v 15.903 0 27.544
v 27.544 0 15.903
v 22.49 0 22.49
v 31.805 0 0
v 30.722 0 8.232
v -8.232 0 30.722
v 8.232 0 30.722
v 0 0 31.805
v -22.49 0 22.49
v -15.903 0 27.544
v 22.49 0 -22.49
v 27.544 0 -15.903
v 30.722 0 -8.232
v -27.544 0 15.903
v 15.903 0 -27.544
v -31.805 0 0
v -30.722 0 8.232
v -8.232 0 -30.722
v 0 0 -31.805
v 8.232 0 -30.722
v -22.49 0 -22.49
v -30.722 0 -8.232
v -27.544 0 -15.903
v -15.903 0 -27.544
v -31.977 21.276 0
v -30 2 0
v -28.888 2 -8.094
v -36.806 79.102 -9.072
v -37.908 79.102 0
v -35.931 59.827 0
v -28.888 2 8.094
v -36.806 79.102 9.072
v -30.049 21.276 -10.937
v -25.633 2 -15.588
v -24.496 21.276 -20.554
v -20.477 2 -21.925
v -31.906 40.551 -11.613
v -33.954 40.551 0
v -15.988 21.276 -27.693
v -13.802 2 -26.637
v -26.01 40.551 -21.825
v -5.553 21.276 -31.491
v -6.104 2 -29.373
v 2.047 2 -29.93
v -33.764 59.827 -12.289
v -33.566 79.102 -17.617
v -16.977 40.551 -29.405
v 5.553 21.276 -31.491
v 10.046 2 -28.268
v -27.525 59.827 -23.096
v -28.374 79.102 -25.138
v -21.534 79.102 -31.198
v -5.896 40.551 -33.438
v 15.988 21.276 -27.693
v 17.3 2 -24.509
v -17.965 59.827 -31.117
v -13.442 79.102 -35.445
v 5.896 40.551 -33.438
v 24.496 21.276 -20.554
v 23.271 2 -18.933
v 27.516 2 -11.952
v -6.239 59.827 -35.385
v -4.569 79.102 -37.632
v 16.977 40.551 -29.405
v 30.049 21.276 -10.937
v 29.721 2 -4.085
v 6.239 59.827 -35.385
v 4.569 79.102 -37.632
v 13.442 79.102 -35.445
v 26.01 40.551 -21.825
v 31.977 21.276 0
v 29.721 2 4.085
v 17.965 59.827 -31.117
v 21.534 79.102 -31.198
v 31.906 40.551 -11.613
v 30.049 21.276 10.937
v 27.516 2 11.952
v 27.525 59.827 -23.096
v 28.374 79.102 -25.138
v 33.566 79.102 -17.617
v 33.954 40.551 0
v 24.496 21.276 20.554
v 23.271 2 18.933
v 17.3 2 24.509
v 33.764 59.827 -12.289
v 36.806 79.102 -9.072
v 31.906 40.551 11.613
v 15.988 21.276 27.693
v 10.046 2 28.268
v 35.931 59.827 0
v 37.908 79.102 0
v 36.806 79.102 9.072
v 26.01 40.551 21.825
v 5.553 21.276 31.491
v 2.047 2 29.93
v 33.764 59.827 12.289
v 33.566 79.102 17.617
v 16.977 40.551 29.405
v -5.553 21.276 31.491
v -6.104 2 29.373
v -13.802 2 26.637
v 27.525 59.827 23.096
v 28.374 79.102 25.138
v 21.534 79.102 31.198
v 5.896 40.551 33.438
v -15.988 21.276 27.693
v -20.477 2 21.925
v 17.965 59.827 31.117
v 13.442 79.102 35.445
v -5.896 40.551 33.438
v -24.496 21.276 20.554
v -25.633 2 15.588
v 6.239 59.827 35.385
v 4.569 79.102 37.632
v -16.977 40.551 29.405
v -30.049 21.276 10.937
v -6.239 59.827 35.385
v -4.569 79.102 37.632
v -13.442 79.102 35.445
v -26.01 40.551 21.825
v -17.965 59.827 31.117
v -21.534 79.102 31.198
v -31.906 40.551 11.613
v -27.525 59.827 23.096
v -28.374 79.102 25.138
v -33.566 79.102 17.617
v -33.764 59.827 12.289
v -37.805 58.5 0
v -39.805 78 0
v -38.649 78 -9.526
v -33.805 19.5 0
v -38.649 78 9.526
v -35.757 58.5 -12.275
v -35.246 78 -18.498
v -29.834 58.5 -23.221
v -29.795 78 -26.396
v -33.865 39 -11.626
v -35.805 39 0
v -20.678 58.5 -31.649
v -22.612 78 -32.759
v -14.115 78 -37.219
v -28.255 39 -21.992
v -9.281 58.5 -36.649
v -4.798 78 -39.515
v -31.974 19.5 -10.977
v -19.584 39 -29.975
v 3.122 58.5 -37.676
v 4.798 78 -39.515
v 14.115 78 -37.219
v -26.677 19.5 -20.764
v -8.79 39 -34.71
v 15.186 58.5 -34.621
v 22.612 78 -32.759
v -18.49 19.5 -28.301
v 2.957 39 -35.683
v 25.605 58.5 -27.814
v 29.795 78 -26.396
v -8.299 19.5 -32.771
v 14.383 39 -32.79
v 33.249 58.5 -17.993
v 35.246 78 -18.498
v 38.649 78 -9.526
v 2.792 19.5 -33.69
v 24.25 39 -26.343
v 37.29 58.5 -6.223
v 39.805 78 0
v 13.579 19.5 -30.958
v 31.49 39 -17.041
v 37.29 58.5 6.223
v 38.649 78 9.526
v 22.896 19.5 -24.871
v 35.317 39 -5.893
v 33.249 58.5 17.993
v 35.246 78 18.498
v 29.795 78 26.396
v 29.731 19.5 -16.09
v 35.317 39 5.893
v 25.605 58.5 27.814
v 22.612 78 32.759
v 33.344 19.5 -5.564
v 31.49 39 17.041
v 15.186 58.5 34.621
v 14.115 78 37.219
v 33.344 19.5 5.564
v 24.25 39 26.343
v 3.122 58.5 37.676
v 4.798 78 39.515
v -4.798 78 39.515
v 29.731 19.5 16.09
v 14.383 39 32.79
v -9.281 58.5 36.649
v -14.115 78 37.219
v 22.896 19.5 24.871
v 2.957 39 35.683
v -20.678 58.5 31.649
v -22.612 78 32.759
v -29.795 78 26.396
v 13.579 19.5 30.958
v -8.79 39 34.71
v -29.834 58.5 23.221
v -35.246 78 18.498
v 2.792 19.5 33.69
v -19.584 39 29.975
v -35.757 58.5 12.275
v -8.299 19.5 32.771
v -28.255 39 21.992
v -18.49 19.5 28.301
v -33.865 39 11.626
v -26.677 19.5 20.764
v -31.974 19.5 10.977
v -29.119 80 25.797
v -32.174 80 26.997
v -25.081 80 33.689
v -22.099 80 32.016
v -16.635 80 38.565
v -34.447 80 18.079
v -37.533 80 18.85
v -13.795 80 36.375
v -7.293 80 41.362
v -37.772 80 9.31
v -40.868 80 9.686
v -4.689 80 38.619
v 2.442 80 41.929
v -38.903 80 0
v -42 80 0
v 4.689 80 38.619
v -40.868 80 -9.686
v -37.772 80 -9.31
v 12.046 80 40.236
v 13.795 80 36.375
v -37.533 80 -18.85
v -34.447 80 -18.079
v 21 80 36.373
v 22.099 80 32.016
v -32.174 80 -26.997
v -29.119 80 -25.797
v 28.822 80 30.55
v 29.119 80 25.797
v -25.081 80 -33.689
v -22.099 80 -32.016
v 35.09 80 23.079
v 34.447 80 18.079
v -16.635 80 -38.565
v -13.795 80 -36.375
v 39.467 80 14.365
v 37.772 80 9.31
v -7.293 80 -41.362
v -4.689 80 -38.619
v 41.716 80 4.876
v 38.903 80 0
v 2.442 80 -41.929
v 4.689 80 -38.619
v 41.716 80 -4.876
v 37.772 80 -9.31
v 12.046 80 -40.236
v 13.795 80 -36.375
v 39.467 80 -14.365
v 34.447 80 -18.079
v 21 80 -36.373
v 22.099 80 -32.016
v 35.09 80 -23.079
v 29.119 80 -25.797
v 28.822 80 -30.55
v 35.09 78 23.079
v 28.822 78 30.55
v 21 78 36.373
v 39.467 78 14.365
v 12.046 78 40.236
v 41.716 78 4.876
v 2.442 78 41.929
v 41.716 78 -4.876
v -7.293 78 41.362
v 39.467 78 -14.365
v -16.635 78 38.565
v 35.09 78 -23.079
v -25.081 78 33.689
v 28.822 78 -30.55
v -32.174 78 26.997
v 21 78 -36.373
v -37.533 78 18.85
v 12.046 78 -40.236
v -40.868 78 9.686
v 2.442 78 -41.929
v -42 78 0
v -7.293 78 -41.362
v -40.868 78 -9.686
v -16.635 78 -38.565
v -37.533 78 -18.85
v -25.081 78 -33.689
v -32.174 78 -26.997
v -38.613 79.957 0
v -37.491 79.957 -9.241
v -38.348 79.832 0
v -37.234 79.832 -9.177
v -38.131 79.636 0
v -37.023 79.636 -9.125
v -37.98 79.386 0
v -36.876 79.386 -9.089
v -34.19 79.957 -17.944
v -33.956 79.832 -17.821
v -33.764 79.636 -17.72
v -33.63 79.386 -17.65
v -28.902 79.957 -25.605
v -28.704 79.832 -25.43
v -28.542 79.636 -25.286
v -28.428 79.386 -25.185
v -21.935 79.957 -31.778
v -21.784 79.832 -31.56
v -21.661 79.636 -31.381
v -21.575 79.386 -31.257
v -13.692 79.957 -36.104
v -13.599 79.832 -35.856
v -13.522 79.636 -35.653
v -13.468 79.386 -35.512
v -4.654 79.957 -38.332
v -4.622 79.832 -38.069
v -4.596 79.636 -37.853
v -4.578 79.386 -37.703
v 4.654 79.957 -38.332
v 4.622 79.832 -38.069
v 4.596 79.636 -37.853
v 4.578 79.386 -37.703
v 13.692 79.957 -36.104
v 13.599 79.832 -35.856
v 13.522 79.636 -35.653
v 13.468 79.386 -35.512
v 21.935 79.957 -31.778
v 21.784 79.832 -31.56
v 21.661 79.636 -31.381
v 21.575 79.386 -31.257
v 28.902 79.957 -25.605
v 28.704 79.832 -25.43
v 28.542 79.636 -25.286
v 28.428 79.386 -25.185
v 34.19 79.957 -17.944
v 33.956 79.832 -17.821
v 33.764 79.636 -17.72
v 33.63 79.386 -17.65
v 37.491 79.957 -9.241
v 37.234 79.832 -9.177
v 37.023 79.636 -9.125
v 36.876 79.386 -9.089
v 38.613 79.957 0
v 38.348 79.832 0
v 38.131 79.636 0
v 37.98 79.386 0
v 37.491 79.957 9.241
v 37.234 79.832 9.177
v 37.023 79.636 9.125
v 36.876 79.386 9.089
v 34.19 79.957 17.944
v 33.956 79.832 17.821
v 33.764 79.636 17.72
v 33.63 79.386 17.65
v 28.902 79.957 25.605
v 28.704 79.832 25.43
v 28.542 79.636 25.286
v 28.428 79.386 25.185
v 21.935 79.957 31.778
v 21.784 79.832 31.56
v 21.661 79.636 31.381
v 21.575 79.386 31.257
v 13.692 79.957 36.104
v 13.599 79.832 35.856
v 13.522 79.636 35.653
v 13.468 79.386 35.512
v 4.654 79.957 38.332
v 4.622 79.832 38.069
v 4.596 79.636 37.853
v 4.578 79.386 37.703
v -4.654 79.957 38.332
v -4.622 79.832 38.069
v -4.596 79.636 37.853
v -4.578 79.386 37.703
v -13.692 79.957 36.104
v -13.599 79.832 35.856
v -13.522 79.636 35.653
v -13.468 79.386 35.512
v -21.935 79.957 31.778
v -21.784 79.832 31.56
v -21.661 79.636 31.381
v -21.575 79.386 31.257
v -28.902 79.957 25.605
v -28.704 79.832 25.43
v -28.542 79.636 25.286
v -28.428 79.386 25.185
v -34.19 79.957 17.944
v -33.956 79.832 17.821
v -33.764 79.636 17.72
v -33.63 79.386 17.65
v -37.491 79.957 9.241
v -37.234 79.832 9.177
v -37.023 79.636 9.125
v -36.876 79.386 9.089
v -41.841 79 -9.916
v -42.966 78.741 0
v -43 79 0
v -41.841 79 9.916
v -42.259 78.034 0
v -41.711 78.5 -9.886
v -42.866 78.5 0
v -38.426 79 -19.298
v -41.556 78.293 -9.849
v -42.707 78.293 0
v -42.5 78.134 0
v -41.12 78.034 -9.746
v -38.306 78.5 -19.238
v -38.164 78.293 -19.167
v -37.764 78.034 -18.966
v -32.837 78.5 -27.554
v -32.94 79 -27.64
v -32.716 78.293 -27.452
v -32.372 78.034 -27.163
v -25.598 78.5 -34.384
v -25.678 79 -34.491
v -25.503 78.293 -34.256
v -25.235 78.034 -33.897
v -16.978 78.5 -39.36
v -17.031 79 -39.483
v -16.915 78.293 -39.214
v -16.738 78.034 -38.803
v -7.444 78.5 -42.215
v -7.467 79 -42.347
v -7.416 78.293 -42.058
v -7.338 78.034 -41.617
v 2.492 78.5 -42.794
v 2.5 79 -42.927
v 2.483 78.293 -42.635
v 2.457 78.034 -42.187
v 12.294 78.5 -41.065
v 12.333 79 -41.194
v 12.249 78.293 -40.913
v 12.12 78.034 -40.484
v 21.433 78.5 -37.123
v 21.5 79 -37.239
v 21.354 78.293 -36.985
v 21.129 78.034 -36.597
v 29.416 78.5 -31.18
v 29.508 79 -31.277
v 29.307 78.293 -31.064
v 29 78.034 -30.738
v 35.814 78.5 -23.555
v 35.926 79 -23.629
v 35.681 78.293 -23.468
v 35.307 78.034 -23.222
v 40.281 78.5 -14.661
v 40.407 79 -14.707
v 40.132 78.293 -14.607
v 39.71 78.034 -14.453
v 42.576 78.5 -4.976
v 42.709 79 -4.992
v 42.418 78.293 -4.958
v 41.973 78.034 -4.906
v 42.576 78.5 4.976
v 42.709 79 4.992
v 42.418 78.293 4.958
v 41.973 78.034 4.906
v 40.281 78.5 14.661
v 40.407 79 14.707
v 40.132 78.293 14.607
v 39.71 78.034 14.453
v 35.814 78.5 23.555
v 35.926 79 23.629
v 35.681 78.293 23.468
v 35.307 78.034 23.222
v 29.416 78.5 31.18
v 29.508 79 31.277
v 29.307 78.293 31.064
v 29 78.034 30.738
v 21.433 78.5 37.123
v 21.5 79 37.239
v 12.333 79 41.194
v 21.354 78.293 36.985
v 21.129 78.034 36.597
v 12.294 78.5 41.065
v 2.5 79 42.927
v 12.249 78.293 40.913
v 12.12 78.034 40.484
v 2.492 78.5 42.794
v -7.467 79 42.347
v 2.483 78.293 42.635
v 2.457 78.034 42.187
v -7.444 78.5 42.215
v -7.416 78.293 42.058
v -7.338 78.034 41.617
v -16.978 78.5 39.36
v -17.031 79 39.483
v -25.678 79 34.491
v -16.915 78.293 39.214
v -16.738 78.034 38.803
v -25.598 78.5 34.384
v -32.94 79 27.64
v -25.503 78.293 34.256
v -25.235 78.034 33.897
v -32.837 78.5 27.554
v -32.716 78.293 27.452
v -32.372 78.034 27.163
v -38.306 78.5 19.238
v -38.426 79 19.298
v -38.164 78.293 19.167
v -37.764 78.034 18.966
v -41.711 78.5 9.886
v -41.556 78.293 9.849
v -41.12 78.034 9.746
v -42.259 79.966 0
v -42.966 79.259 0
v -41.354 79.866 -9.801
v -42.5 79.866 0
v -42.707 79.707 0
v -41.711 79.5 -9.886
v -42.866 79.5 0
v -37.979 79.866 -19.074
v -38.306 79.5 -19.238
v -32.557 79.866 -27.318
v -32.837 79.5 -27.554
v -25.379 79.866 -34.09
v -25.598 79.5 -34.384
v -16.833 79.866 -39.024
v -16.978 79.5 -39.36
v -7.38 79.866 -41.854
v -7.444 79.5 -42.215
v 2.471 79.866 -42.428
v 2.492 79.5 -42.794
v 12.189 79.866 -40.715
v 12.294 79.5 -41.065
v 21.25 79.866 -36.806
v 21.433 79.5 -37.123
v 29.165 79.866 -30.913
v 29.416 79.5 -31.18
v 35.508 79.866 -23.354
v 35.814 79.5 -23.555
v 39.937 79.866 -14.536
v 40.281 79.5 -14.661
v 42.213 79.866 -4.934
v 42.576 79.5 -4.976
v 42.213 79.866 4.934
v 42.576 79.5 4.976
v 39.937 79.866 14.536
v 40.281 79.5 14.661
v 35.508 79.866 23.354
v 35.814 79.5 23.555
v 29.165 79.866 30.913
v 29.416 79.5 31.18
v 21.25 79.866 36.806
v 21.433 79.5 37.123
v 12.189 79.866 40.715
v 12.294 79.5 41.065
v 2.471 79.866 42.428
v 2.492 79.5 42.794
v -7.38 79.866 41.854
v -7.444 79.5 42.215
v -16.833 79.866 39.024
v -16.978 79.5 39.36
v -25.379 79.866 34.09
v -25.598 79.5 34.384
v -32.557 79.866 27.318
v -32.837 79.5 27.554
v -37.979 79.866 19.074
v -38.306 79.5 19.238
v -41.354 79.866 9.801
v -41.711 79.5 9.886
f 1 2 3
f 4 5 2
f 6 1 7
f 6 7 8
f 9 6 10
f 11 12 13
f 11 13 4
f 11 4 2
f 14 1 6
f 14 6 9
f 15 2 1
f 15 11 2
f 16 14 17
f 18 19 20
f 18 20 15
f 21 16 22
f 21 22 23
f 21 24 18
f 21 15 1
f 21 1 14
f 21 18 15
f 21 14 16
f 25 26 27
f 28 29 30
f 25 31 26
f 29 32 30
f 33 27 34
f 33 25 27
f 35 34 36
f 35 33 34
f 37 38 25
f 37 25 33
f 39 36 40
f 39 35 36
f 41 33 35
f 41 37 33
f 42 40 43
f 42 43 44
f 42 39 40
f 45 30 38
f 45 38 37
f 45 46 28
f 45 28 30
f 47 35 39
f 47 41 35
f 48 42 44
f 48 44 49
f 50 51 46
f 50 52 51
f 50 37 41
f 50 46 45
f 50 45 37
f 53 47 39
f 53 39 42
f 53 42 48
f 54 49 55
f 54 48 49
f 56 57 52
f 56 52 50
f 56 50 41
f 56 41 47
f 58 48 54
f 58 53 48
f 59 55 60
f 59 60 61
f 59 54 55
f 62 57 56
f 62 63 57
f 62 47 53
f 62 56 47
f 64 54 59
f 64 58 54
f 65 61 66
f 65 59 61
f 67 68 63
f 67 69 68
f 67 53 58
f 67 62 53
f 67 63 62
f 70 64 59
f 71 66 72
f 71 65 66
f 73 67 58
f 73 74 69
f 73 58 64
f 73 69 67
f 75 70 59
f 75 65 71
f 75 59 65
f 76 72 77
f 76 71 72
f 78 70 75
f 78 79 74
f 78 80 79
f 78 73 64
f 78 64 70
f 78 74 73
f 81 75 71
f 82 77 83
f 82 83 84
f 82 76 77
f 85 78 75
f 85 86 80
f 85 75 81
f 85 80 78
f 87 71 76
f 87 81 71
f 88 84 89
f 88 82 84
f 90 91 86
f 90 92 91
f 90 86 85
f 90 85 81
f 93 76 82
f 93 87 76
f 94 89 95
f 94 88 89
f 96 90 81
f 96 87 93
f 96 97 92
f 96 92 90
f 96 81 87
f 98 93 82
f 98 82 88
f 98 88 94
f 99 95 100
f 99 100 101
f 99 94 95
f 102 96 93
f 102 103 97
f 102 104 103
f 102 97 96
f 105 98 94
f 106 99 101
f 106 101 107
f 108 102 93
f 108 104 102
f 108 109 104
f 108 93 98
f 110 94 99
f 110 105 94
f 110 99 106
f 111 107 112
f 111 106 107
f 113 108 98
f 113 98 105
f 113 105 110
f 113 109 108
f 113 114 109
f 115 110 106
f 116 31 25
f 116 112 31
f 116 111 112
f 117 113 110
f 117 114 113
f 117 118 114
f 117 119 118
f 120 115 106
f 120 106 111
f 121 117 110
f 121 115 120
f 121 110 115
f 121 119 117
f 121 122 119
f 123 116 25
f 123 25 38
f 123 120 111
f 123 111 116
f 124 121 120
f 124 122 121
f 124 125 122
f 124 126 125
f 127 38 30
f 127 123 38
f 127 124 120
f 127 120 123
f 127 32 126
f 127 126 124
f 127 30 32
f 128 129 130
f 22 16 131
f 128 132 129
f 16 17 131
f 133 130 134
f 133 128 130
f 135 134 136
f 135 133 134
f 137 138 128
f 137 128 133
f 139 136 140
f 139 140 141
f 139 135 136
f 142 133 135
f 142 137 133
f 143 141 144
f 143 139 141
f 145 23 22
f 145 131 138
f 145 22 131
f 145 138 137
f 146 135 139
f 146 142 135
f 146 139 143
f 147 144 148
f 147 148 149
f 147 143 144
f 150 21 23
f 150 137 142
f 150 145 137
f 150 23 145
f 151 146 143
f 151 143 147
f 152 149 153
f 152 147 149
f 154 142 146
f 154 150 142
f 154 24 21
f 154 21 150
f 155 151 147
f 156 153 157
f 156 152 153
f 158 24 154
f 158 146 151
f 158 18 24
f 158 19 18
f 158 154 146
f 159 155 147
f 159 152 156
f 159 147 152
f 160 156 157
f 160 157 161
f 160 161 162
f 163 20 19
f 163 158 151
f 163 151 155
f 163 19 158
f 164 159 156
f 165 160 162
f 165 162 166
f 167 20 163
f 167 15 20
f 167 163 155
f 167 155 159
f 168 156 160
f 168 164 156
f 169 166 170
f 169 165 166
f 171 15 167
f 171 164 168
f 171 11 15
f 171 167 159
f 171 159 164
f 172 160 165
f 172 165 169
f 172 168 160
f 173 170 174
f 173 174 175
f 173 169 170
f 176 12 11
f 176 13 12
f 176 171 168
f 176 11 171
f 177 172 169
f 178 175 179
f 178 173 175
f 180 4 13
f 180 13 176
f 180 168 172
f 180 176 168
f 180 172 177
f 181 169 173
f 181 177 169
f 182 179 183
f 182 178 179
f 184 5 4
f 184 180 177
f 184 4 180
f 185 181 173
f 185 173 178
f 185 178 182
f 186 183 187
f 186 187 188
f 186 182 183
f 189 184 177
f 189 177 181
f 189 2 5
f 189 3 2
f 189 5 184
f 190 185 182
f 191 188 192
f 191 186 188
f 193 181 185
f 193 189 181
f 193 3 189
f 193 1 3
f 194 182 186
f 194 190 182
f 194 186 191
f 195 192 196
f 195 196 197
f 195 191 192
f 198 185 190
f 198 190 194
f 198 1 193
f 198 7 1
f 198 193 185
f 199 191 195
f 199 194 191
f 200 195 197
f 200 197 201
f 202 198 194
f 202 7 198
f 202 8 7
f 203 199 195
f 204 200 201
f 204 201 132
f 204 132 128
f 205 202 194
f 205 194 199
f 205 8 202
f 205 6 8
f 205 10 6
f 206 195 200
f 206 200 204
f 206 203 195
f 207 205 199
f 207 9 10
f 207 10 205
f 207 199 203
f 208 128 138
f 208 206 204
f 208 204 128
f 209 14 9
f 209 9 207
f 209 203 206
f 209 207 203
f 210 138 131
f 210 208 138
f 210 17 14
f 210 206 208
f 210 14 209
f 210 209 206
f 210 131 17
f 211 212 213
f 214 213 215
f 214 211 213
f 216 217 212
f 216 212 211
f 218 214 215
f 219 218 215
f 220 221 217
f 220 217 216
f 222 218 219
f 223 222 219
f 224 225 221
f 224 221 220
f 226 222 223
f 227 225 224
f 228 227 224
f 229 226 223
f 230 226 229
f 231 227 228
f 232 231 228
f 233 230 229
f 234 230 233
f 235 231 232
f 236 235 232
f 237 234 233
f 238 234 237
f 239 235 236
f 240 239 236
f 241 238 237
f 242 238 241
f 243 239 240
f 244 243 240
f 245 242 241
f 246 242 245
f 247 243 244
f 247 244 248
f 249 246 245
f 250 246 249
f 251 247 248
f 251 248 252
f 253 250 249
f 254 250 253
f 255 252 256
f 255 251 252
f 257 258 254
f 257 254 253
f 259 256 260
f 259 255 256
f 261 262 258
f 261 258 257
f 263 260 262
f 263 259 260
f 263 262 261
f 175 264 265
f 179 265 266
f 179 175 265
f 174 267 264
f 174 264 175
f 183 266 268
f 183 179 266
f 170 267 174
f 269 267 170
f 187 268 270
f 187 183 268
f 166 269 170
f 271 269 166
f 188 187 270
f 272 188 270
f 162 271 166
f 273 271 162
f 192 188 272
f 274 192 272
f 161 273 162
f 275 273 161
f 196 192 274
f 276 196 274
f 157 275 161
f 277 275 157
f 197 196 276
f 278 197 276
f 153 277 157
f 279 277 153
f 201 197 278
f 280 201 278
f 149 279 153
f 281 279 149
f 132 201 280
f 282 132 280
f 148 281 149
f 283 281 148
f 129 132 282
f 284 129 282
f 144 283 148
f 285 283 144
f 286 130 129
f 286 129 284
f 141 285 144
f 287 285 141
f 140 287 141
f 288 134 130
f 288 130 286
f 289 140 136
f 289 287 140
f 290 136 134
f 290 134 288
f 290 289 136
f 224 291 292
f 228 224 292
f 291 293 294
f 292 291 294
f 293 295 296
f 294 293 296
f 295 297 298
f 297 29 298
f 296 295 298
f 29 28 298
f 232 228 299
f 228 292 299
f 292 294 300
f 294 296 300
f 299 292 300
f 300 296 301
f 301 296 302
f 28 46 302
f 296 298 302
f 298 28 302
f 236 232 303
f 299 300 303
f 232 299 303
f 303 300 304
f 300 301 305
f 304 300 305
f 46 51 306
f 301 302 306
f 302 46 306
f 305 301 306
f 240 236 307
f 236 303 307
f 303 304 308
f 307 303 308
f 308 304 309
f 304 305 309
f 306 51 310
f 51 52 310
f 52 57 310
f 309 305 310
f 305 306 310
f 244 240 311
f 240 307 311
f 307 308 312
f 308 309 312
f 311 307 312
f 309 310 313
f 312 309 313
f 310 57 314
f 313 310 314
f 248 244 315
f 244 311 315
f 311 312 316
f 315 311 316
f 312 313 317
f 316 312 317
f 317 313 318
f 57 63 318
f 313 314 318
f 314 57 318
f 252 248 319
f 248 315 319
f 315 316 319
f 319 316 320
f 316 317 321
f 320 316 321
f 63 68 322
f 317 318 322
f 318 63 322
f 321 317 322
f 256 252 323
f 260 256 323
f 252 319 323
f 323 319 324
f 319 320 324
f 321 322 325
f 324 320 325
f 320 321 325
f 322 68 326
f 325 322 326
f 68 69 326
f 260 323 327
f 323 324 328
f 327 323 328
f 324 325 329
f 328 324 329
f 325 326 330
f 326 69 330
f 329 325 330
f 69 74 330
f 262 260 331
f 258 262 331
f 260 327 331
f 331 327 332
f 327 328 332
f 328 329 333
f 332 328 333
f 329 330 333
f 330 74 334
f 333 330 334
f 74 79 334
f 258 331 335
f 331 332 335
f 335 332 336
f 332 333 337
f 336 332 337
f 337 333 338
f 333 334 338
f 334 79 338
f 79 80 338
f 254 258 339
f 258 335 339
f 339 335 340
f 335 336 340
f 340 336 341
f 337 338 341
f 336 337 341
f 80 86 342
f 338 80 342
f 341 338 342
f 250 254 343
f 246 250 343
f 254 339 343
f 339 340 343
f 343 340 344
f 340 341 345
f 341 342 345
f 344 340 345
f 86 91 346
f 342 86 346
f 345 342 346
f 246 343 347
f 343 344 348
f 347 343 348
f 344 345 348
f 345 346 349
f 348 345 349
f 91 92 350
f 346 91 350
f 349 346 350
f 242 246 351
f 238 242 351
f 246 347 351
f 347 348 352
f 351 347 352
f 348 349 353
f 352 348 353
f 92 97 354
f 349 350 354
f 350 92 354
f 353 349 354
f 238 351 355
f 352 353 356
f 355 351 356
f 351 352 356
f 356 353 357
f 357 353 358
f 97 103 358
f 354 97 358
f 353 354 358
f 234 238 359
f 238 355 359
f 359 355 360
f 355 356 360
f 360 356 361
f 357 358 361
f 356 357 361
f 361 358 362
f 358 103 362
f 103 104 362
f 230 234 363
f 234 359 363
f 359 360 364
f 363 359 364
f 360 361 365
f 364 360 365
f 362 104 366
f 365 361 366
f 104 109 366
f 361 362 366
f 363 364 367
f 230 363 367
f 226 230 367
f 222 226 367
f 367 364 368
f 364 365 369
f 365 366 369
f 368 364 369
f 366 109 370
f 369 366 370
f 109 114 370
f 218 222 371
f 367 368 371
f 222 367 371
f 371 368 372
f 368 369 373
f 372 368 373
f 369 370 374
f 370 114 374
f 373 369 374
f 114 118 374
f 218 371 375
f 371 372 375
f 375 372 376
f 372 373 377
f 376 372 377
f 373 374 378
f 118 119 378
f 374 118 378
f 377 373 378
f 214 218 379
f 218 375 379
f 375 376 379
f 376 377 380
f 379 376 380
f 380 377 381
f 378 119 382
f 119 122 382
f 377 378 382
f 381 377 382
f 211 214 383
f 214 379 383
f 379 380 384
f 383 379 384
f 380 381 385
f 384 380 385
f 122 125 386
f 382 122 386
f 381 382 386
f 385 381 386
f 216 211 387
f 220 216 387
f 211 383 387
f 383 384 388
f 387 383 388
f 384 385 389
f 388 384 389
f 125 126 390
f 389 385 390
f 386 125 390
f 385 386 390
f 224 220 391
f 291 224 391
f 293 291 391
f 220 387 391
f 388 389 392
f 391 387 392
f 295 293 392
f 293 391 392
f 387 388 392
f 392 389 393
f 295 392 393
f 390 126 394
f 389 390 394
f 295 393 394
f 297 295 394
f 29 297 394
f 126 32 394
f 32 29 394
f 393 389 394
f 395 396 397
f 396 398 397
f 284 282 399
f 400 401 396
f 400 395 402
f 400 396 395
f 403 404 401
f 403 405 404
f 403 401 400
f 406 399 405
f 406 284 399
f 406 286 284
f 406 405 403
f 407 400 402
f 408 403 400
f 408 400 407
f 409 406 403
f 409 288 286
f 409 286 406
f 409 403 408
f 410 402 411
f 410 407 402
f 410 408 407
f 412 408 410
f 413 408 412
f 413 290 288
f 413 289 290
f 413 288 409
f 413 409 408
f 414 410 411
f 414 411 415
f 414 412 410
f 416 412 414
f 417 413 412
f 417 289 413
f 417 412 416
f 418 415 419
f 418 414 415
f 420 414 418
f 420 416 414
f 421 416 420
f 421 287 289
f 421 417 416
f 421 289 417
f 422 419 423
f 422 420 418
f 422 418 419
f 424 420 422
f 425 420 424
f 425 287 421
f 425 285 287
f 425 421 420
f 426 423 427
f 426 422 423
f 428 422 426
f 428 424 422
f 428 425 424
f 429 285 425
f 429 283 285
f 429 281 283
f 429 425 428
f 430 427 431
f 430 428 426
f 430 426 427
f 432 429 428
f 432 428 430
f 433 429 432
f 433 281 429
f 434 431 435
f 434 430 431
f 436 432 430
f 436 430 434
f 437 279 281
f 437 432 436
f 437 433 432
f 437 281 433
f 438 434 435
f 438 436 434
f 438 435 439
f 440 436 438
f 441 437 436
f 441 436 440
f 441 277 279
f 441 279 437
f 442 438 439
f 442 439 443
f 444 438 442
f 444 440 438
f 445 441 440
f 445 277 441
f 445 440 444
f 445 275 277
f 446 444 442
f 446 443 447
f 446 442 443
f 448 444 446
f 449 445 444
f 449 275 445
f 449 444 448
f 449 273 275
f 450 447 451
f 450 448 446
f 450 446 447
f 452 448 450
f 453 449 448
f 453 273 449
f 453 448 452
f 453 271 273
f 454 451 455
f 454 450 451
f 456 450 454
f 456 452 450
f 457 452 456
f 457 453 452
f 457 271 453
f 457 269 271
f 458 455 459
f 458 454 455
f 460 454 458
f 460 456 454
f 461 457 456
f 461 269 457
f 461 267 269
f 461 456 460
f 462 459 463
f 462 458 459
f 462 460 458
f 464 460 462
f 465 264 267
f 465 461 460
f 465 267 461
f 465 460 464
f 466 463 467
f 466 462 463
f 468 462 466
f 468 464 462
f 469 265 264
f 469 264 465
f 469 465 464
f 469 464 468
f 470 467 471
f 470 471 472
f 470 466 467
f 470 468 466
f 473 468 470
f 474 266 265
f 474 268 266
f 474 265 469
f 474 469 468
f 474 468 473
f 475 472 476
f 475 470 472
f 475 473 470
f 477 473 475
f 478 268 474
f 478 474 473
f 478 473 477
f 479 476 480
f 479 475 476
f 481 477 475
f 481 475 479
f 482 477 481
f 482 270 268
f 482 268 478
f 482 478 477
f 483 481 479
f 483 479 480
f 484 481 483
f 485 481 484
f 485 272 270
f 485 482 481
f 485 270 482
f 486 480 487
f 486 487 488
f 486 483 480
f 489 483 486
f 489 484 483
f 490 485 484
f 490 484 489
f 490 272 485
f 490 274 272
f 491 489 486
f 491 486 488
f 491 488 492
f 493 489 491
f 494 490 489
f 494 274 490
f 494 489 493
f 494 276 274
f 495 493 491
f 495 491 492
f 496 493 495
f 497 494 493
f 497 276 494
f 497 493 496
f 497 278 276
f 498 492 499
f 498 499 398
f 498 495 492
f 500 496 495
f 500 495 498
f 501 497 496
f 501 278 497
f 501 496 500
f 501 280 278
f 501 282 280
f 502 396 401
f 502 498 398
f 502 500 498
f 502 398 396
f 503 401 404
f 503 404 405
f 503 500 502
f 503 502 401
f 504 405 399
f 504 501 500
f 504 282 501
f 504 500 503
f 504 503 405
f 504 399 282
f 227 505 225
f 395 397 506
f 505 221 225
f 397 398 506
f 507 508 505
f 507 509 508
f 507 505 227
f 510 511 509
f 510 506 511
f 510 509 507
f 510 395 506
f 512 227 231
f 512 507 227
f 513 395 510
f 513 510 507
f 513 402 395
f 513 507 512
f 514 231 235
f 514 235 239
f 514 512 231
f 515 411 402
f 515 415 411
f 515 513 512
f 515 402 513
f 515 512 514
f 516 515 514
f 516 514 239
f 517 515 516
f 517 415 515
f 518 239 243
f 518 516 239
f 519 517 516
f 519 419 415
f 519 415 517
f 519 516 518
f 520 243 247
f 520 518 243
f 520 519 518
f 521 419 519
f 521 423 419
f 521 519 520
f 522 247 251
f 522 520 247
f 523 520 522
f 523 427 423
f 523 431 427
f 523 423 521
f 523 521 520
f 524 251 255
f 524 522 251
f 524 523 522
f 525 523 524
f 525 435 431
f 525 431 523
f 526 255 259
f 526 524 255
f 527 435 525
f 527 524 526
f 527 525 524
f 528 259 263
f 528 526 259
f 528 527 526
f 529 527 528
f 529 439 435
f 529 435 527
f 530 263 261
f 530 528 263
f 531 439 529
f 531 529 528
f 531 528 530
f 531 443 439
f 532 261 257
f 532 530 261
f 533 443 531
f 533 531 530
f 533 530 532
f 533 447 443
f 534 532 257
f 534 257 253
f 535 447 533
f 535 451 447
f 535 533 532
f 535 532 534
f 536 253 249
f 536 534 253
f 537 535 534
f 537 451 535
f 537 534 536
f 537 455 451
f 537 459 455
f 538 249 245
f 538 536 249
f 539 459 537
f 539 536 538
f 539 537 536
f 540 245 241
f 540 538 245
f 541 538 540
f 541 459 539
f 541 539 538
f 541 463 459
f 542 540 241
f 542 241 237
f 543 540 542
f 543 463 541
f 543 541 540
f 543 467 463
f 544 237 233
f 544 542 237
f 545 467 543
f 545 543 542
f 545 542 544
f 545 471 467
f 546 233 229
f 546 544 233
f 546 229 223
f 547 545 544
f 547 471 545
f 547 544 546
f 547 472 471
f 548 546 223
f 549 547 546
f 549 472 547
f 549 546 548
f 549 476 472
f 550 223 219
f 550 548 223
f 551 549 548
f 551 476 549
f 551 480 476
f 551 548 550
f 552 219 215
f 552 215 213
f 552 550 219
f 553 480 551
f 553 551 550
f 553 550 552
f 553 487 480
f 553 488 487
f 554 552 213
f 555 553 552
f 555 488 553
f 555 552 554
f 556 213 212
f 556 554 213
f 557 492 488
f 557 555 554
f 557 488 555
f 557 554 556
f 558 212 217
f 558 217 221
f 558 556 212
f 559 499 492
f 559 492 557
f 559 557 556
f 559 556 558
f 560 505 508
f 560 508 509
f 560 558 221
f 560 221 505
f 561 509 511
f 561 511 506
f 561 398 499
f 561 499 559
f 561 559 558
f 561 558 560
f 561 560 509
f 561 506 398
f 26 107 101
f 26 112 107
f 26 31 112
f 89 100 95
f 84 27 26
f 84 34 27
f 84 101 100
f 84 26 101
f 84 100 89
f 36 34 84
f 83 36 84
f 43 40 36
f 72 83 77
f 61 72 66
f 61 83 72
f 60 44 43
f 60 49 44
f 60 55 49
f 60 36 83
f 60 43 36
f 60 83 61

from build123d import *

# Parameters (mm, degrees)
F2_R = 0.99999
F3_R = 1


# Not quite as in the source:
# - a fillet or chamfer is up to 0.001 mm smaller than in the source, because OpenCascade refuses the exact size


with BuildPart() as f1:
    # F0 (on Top) → F1 (revolve)
    with BuildSketch(Plane.XY):
        Polygon((-31.8053636701, 0), (0, 0), (0, 2), (-30, 2), (-38, 80), (-43, 80), (-43, 78), (-39.8053636701, 78), align=None)
    revolve(axis=Axis((0, 3.6410242221, 0), (0, -1, 0)))

    # F2 (radius 1 in the source; OpenCascade refuses exactly that, so slightly less here)
    f2_edges = [f1.edges().sort_by_distance(p)[0] for p in [
        (43, 80, 0),
        (43, 78, 0),
        (-43, 79, 0),
    ]]
    fillet(f2_edges, radius=F2_R)

    # F3
    f3_edges = [f1.edges().sort_by_distance(p)[0] for p in [
        (38, 80, 0),
    ]]
    fillet(f3_edges, radius=F3_R)


solid = f1.part
